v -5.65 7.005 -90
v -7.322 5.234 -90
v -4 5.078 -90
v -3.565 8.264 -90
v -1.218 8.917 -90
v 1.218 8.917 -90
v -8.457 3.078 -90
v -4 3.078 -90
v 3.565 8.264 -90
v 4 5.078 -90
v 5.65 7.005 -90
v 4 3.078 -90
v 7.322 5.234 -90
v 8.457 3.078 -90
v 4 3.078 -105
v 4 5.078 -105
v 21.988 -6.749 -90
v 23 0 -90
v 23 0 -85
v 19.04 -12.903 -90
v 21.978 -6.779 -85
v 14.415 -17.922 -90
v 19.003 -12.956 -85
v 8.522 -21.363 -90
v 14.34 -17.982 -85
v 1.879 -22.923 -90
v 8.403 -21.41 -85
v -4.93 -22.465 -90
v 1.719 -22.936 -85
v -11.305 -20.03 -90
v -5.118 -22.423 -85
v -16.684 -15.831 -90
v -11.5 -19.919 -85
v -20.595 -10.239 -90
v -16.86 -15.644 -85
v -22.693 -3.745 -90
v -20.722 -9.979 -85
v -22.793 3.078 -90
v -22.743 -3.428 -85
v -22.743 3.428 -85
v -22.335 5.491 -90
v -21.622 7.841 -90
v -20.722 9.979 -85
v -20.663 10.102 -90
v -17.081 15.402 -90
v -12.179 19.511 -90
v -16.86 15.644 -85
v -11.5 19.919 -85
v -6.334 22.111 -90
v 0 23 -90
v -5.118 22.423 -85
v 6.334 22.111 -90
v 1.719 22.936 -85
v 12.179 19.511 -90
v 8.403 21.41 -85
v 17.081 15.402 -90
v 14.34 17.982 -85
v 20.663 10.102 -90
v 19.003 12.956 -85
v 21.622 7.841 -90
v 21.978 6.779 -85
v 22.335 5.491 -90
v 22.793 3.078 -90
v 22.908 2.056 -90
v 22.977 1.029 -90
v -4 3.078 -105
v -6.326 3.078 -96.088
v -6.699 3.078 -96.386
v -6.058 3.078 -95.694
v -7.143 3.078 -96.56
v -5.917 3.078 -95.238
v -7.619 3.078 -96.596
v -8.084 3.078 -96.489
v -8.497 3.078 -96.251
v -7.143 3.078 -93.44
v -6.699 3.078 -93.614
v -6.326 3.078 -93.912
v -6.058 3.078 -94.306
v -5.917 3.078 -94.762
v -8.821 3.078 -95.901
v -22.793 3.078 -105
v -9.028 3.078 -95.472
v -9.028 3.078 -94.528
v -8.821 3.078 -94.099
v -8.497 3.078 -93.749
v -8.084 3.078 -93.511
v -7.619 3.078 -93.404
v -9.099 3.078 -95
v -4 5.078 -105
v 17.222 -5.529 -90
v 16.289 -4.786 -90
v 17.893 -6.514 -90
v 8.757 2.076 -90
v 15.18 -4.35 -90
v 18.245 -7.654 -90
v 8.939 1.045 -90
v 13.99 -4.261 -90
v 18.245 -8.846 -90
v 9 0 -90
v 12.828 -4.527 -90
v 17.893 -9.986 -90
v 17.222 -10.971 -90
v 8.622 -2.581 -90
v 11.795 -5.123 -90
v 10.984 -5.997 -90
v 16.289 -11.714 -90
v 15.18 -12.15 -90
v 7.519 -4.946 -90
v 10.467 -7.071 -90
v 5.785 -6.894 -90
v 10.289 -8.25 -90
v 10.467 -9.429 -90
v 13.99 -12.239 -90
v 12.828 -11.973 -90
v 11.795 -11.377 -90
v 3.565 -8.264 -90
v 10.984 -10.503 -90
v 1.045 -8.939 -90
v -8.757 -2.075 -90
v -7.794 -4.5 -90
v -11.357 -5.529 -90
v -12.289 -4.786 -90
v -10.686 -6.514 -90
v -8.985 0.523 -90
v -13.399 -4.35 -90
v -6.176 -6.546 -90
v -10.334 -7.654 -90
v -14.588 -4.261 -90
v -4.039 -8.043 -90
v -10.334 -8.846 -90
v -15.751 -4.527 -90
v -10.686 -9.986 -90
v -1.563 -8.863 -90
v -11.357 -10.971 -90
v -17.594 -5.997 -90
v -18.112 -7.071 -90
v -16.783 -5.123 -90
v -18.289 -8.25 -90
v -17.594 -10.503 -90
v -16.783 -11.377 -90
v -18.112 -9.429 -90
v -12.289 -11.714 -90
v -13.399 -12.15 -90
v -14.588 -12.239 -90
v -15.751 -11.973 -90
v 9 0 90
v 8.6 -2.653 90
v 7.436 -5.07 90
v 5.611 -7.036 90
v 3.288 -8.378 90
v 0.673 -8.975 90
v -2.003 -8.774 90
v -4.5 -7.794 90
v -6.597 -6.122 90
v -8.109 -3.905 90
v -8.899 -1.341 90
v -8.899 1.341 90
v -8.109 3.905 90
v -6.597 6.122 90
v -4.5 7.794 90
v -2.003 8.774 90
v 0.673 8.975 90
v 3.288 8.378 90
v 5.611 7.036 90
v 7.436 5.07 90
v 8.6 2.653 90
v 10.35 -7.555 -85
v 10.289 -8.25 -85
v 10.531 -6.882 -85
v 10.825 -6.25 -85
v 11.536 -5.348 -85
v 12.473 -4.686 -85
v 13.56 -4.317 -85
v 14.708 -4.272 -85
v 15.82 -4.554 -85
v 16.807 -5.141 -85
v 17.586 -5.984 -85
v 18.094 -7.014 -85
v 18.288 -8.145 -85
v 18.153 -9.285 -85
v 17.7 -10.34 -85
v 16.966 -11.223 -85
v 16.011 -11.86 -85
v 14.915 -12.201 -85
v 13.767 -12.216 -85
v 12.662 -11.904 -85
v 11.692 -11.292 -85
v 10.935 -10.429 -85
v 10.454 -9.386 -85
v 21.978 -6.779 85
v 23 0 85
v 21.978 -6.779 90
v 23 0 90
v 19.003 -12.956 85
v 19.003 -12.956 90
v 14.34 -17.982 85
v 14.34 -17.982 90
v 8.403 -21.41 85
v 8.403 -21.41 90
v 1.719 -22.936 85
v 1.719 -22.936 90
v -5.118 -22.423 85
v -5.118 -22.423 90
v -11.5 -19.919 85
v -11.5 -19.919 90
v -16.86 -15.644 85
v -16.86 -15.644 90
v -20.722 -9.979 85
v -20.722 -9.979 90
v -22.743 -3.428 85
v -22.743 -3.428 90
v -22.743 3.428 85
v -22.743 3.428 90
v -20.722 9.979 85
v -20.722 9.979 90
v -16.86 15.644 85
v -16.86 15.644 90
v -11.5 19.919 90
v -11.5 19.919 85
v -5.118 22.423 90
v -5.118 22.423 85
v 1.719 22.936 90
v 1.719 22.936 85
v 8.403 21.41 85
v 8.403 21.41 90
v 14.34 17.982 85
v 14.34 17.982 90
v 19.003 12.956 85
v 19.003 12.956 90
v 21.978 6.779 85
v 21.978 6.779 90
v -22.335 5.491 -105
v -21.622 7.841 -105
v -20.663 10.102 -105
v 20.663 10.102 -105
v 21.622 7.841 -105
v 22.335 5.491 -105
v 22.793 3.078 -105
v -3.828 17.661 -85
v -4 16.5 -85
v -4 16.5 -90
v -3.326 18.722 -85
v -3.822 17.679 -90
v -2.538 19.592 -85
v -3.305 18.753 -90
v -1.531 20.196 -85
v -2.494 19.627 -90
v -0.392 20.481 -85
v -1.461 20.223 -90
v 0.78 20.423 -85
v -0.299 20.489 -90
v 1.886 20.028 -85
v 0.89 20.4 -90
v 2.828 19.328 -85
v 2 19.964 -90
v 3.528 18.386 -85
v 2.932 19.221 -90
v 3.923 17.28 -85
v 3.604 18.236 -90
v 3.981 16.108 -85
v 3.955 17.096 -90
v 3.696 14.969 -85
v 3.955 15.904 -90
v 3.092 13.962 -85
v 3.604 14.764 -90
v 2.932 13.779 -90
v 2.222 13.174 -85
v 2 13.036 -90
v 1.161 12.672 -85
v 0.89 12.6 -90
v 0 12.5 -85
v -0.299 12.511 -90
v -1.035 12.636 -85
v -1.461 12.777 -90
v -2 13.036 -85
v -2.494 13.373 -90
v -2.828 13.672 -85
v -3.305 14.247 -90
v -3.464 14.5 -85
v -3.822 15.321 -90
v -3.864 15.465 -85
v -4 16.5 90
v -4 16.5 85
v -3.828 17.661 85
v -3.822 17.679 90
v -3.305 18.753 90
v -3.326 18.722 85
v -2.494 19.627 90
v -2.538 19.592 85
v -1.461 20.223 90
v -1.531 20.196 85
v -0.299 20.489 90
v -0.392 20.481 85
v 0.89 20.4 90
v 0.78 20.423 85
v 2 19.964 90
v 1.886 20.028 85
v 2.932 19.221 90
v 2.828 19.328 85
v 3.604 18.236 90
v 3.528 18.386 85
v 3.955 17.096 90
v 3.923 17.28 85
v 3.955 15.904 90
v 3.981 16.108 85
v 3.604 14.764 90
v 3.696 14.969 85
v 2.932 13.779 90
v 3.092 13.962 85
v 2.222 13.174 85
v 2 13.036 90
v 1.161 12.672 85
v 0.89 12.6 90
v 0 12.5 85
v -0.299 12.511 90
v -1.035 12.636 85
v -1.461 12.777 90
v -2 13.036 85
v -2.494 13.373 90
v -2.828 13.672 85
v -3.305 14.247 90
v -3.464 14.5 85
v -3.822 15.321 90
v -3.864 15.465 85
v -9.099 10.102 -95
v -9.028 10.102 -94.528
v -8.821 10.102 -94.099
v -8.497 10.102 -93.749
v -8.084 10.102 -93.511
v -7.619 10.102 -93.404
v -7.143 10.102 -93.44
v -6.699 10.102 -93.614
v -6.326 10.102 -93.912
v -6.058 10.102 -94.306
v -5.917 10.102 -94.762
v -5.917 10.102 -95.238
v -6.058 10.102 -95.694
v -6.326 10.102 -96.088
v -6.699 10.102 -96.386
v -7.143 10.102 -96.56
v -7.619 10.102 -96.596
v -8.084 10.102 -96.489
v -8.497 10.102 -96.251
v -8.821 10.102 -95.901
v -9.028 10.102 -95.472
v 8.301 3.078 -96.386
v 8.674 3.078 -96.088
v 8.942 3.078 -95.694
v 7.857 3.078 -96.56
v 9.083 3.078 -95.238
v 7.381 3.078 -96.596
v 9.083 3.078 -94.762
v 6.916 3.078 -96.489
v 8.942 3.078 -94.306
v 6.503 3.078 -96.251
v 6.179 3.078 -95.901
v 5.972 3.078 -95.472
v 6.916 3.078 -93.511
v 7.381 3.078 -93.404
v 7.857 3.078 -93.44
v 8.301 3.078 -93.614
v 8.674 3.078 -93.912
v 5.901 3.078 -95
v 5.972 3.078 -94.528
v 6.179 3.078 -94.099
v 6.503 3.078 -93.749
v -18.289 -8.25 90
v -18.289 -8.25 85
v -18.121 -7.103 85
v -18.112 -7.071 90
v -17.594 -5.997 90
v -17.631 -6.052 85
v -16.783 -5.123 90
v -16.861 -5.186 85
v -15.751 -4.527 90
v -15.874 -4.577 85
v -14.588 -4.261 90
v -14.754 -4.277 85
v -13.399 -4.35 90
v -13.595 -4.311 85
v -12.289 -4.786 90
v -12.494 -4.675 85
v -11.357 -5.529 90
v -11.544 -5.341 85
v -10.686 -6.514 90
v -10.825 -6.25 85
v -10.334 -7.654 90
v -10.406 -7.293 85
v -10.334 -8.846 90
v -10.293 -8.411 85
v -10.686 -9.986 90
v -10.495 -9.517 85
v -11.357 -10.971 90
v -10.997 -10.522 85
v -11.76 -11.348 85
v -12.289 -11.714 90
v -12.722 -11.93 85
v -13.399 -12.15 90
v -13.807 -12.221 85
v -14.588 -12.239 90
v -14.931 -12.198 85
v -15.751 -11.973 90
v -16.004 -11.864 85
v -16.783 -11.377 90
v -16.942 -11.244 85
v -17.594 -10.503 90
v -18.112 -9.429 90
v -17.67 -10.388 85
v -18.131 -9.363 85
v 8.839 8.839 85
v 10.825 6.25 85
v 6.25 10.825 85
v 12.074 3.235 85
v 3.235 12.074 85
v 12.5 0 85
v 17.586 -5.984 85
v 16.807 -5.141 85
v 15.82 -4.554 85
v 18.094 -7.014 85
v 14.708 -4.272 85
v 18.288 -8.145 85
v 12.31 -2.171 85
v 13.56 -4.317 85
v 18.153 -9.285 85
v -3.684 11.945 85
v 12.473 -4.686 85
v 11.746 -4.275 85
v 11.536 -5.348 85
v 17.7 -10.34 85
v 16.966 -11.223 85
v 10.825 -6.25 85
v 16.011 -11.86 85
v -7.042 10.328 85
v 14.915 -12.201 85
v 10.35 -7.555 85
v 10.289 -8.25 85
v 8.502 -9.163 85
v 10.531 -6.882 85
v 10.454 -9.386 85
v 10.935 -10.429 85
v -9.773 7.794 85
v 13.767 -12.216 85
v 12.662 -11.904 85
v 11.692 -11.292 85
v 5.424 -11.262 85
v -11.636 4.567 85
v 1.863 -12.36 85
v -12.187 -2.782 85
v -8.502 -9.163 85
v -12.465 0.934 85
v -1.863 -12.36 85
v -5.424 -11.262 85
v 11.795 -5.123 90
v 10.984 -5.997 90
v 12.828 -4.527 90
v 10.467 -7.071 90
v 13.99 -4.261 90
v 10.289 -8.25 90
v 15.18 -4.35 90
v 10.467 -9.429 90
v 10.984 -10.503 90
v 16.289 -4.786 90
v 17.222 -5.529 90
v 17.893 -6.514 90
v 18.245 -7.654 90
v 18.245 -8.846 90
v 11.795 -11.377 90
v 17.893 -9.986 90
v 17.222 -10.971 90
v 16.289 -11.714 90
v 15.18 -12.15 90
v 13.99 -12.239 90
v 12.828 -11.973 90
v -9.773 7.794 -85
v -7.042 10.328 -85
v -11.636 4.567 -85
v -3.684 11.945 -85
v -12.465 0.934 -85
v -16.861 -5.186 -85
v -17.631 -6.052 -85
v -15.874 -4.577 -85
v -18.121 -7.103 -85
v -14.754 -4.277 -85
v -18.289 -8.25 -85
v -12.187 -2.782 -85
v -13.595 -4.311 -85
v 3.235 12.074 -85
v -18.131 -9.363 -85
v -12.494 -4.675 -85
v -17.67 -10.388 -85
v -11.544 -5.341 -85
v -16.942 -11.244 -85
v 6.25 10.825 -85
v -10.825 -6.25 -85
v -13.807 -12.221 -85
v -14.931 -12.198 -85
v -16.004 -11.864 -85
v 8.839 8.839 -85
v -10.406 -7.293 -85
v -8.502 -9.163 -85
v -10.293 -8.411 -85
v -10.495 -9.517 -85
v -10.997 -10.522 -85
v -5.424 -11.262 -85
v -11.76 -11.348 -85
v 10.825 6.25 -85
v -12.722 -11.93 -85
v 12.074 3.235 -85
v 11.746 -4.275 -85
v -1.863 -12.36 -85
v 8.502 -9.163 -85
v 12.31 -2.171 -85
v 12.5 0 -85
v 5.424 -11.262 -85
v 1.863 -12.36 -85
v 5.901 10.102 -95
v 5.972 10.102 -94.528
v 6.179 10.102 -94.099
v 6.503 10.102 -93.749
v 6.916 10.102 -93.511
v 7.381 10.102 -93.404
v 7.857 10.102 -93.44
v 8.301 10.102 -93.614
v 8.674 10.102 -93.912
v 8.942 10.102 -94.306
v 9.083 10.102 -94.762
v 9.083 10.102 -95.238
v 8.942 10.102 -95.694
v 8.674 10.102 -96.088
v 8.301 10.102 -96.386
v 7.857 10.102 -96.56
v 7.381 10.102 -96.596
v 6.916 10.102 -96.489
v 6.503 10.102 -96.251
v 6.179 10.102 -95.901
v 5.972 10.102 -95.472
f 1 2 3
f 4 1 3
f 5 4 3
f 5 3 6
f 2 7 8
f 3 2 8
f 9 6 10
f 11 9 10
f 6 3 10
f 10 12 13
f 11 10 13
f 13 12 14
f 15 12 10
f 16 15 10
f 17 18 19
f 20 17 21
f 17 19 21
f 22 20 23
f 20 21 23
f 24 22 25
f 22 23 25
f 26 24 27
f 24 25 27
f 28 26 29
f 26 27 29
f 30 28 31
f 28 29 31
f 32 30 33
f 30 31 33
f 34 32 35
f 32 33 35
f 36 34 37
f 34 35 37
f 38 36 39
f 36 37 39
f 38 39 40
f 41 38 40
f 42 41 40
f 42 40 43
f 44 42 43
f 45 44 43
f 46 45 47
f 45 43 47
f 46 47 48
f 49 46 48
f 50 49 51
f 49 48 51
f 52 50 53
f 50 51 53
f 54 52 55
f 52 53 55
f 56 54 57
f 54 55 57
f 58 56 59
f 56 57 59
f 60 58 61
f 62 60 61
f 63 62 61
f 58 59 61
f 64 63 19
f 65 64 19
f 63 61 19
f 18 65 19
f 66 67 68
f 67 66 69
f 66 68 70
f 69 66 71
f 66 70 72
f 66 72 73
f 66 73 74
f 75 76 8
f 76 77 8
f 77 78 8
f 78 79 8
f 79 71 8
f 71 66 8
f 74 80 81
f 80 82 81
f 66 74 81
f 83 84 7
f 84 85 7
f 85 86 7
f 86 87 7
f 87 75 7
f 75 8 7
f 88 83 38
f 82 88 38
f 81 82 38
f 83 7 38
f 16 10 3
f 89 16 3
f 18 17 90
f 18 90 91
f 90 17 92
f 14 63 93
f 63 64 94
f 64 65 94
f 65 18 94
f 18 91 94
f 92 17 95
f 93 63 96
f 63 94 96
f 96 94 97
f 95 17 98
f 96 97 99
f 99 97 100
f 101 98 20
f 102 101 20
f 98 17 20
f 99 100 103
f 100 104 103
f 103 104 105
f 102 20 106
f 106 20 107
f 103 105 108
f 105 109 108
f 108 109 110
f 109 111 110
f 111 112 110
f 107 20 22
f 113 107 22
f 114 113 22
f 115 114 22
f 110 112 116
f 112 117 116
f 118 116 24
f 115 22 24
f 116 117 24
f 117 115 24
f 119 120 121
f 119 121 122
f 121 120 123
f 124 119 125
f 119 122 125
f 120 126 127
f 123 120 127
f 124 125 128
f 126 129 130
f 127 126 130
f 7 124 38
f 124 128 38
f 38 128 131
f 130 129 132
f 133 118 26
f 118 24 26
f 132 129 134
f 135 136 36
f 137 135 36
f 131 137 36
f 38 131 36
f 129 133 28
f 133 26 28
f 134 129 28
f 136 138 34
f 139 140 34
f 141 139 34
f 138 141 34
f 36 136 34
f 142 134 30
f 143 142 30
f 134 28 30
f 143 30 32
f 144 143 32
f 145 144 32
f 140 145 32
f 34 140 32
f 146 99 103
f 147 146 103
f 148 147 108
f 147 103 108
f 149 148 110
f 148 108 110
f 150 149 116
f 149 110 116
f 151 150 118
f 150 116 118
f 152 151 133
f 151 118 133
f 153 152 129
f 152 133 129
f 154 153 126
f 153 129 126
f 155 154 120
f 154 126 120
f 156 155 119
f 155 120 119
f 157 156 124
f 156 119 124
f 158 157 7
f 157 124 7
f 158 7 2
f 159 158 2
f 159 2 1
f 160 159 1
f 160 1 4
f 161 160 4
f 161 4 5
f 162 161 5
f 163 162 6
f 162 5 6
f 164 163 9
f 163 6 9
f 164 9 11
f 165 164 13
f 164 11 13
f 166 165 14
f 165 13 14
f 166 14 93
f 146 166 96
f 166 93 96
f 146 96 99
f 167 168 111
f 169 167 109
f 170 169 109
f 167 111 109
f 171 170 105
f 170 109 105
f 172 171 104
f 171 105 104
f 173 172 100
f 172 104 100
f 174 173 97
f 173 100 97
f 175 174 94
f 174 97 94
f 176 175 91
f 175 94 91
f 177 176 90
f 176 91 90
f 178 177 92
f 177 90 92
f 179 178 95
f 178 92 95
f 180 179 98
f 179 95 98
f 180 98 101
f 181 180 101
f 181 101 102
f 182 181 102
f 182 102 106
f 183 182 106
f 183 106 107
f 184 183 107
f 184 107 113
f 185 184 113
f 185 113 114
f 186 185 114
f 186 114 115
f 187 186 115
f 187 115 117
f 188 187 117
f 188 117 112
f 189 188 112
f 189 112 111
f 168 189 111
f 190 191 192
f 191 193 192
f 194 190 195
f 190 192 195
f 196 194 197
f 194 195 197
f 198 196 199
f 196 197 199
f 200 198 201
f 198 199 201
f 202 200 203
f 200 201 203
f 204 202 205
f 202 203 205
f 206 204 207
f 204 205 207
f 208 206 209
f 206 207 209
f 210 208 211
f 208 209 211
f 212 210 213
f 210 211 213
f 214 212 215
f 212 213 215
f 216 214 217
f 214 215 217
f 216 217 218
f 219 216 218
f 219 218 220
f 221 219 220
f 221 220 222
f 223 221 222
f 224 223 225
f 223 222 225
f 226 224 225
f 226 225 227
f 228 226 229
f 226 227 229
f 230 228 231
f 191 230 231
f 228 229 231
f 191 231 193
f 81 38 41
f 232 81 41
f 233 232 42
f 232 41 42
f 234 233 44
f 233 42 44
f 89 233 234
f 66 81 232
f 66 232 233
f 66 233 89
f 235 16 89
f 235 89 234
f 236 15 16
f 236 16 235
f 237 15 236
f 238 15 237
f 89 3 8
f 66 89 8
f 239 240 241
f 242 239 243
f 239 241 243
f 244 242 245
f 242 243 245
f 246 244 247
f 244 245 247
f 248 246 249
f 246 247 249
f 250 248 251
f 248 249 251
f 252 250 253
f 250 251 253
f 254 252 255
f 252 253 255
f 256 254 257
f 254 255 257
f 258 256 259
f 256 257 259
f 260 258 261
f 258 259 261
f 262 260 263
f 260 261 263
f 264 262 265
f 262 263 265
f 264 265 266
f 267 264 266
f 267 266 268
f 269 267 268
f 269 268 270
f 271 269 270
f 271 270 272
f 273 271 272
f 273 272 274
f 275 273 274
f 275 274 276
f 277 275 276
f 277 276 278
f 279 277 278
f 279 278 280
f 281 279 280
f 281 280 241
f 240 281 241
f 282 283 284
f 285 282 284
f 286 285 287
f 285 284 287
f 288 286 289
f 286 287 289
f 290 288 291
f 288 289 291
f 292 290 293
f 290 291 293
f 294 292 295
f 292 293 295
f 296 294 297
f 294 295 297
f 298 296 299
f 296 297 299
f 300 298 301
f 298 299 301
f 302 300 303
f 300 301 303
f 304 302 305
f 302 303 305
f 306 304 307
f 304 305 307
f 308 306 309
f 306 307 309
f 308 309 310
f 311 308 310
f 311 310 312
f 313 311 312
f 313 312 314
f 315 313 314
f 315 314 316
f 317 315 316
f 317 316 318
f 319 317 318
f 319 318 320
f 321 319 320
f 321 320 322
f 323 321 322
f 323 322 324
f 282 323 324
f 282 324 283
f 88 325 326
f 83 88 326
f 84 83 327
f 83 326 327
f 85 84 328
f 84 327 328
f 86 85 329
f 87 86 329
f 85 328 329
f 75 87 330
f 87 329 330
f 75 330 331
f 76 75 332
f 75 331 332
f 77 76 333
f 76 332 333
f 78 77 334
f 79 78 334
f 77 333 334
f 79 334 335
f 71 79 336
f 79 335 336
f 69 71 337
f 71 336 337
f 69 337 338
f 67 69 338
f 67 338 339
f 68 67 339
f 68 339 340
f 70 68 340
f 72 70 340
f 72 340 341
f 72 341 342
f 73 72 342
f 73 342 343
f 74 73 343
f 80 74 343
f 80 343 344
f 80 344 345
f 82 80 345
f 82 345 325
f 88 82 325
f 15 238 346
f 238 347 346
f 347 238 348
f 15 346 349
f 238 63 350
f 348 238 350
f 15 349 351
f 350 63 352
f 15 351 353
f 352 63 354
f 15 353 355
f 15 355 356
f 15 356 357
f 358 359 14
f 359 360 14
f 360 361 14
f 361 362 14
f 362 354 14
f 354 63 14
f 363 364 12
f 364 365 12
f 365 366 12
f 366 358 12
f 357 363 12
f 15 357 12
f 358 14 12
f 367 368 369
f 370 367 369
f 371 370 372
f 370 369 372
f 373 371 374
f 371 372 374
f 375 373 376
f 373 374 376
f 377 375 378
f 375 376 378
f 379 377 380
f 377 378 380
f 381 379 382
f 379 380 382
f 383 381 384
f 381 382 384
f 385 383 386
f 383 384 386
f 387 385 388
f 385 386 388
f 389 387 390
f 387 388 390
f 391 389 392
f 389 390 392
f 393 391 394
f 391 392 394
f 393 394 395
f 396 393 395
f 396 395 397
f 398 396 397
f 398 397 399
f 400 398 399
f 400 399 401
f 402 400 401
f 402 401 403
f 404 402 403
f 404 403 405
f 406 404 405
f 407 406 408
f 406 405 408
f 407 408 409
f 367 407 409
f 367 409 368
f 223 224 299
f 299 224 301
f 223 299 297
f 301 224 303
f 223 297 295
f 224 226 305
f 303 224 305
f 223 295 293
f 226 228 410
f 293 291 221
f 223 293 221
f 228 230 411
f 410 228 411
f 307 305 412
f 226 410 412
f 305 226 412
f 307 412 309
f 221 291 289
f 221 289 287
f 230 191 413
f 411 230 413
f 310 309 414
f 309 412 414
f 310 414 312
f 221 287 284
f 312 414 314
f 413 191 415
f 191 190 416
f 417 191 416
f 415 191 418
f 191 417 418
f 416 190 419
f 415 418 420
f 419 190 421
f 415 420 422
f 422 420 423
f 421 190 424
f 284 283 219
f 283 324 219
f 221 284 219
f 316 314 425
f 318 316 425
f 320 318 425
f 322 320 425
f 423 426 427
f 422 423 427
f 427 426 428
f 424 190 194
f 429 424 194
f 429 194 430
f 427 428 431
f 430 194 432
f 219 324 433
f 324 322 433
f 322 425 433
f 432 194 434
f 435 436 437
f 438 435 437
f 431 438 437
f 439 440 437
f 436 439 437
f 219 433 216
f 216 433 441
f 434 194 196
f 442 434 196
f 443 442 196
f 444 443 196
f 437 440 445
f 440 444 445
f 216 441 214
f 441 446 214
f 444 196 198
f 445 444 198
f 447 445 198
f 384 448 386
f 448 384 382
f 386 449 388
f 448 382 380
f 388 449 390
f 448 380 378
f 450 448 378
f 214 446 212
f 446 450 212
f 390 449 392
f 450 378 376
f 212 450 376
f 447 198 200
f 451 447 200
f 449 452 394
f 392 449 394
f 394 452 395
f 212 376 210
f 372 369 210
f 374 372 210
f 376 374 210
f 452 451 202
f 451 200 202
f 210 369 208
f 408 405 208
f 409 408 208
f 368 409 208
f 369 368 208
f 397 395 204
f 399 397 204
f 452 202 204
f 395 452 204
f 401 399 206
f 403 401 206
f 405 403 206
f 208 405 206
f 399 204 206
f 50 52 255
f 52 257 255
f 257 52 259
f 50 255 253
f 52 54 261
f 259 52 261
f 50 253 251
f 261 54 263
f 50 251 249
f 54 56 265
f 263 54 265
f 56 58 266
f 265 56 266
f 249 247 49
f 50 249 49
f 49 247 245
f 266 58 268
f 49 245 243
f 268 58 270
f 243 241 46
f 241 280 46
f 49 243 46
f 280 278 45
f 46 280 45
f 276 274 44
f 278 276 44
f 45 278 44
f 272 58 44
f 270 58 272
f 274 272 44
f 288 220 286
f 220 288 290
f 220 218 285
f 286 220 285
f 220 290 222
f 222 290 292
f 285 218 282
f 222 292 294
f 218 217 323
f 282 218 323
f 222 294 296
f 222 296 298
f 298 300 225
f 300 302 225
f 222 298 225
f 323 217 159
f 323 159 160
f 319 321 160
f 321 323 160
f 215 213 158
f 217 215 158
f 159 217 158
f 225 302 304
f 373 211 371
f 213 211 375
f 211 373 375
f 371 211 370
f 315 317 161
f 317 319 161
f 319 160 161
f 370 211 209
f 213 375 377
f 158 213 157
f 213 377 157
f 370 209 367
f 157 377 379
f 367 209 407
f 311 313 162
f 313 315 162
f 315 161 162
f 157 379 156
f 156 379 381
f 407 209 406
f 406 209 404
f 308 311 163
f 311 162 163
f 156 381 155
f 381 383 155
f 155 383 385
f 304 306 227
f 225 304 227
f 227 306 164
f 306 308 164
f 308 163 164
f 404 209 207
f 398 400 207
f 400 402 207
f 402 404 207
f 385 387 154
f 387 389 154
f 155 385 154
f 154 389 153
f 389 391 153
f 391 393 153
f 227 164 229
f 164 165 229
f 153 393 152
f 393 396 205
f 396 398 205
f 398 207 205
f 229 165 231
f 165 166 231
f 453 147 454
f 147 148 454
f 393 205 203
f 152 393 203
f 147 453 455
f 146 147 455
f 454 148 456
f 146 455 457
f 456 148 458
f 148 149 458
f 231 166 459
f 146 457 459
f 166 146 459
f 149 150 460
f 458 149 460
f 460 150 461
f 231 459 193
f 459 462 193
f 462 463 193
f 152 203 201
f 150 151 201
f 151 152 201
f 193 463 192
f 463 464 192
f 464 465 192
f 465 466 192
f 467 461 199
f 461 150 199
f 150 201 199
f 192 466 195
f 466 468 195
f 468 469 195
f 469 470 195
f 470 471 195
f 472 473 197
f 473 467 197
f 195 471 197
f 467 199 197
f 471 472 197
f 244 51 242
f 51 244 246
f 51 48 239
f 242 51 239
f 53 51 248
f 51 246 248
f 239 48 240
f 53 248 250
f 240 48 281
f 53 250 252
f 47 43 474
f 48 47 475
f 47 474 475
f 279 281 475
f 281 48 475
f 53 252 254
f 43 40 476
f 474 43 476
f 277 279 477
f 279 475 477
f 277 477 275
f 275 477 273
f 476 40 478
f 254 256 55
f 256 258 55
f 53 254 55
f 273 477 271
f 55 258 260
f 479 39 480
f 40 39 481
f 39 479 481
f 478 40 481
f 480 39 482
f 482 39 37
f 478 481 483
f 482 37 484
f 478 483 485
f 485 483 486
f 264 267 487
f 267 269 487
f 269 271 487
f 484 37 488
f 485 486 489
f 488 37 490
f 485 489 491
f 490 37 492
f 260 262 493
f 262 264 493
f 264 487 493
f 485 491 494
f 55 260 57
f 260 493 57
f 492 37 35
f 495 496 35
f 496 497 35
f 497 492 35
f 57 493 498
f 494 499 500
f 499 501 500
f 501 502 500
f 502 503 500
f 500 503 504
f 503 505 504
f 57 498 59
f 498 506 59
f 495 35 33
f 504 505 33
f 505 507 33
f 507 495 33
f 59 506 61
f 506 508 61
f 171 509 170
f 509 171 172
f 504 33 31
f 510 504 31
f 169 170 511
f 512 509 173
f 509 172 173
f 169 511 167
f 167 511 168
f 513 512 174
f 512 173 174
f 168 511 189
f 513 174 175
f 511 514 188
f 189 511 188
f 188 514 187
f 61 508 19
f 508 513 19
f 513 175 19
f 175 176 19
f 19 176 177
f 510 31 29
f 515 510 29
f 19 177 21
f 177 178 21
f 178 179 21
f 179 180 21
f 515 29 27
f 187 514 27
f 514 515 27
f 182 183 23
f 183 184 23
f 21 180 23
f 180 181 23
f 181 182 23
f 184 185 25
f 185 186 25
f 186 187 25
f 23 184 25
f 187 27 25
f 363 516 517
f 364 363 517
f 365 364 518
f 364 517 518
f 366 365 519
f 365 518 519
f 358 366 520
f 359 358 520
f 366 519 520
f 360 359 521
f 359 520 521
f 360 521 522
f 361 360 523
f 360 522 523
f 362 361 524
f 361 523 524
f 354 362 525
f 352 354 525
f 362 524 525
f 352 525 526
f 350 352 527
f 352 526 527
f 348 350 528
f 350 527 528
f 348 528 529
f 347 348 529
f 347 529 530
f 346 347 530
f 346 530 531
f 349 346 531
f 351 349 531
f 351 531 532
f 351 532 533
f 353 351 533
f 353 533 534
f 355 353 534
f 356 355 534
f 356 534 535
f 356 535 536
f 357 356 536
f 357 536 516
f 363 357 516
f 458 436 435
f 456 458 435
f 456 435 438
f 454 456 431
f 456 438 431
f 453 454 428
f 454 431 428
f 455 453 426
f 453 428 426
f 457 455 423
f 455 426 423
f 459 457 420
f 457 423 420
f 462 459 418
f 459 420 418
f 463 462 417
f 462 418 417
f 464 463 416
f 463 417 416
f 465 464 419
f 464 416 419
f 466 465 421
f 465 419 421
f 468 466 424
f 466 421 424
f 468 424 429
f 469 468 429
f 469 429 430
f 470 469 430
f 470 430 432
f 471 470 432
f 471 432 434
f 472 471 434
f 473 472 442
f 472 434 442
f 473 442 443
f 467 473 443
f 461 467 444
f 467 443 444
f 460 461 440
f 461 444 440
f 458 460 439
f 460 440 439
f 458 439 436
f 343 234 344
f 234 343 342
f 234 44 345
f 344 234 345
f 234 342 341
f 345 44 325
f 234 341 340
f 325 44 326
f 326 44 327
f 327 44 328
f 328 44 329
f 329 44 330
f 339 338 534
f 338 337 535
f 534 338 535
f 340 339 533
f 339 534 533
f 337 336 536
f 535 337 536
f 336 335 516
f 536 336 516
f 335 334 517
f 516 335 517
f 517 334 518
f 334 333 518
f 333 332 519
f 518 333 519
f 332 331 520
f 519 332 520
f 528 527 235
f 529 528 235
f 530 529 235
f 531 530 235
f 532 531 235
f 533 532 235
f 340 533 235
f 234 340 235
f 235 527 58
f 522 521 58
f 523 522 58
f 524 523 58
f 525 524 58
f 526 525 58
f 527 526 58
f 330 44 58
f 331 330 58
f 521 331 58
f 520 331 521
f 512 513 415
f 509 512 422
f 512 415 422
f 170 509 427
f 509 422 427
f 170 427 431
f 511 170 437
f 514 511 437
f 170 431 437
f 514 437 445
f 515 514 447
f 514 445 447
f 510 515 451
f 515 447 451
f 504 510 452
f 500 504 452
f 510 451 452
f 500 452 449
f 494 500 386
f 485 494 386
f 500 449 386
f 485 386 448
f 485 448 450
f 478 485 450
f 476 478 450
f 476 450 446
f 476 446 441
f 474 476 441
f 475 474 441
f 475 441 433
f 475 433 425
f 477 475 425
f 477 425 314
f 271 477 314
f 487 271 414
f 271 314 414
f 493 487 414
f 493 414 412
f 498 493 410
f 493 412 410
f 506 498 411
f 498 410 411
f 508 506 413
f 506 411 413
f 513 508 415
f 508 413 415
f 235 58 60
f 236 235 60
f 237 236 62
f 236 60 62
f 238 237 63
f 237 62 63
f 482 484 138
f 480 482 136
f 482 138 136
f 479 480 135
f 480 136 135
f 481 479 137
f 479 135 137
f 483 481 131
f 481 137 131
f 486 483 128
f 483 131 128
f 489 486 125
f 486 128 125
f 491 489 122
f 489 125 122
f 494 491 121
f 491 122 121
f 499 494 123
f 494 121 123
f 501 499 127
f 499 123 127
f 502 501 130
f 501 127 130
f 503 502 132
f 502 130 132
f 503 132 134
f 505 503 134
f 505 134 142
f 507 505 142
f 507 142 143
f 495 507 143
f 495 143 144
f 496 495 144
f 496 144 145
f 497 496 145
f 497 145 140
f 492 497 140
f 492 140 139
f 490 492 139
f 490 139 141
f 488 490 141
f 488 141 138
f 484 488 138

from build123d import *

# Parameters (mm, degrees)
F0_W     = 3.5
F0_H     = 170
F3_DEPTH = 15
F5_D     = 3.2
F7_D     = 8


with BuildPart() as f1:
    # F0 (on Front) → F1 (revolve)
    with BuildSketch(Plane.XZ):
        with Locations((10.75, 0)):
            Rectangle(F0_W, F0_H)
        Polygon((9, 90), (9, 85), (12.5, 85), (23, 85), (23, 90), align=None)
        Polygon((12.5, -85), (9, -85), (9, -90), (23, -90), (23, -85), align=None)
    revolve(axis=Axis((0, 0, 0), (0, 0, -1)))

    # F2 (on face) → F3 (join)
    with BuildSketch(Plane(origin=(0, 0, -90), x_dir=(1, 0, 0), z_dir=(0, 0, -1))):
        with BuildLine():
            ThreePointArc((-22.793060873, -3.0783723037), (-22.0098278753, -6.6758877236), (-20.6625952799, -10.1023342006))
            Line((-20.6625952799, -10.1023342006), (20.6625952799, -10.1023342006))
            ThreePointArc((20.6625952799, -10.1023342006), (22.0098278753, -6.6758877236), (22.793060873, -3.0783723037))
            Line((22.793060873, -3.0783723037), (4, -3.0783723037))
            Line((4, -3.0783723037), (4, -5.0783723037))
            Line((4, -5.0783723037), (-4, -5.0783723037))
            Line((-4, -5.0783723037), (-4, -3.0783723037))
            Line((-4, -3.0783723037), (-22.793060873, -3.0783723037))
        make_face()
    extrude(amount=F3_DEPTH)

    # F5 (through all)
    with Locations(Plane.XZ.offset(-3.0783723037)):
        with Locations((-7.4993308043, -95), (7.5006691957, -95)):
            Hole(F5_D / 2)

    # F7 (through all)
    with Locations(Plane.XY.offset(90)):
        with Locations((-14.2894191624, -8.25), (0, 16.5), (14.2894191624, -8.25)):
            Hole(F7_D / 2)


solid = f1.part
